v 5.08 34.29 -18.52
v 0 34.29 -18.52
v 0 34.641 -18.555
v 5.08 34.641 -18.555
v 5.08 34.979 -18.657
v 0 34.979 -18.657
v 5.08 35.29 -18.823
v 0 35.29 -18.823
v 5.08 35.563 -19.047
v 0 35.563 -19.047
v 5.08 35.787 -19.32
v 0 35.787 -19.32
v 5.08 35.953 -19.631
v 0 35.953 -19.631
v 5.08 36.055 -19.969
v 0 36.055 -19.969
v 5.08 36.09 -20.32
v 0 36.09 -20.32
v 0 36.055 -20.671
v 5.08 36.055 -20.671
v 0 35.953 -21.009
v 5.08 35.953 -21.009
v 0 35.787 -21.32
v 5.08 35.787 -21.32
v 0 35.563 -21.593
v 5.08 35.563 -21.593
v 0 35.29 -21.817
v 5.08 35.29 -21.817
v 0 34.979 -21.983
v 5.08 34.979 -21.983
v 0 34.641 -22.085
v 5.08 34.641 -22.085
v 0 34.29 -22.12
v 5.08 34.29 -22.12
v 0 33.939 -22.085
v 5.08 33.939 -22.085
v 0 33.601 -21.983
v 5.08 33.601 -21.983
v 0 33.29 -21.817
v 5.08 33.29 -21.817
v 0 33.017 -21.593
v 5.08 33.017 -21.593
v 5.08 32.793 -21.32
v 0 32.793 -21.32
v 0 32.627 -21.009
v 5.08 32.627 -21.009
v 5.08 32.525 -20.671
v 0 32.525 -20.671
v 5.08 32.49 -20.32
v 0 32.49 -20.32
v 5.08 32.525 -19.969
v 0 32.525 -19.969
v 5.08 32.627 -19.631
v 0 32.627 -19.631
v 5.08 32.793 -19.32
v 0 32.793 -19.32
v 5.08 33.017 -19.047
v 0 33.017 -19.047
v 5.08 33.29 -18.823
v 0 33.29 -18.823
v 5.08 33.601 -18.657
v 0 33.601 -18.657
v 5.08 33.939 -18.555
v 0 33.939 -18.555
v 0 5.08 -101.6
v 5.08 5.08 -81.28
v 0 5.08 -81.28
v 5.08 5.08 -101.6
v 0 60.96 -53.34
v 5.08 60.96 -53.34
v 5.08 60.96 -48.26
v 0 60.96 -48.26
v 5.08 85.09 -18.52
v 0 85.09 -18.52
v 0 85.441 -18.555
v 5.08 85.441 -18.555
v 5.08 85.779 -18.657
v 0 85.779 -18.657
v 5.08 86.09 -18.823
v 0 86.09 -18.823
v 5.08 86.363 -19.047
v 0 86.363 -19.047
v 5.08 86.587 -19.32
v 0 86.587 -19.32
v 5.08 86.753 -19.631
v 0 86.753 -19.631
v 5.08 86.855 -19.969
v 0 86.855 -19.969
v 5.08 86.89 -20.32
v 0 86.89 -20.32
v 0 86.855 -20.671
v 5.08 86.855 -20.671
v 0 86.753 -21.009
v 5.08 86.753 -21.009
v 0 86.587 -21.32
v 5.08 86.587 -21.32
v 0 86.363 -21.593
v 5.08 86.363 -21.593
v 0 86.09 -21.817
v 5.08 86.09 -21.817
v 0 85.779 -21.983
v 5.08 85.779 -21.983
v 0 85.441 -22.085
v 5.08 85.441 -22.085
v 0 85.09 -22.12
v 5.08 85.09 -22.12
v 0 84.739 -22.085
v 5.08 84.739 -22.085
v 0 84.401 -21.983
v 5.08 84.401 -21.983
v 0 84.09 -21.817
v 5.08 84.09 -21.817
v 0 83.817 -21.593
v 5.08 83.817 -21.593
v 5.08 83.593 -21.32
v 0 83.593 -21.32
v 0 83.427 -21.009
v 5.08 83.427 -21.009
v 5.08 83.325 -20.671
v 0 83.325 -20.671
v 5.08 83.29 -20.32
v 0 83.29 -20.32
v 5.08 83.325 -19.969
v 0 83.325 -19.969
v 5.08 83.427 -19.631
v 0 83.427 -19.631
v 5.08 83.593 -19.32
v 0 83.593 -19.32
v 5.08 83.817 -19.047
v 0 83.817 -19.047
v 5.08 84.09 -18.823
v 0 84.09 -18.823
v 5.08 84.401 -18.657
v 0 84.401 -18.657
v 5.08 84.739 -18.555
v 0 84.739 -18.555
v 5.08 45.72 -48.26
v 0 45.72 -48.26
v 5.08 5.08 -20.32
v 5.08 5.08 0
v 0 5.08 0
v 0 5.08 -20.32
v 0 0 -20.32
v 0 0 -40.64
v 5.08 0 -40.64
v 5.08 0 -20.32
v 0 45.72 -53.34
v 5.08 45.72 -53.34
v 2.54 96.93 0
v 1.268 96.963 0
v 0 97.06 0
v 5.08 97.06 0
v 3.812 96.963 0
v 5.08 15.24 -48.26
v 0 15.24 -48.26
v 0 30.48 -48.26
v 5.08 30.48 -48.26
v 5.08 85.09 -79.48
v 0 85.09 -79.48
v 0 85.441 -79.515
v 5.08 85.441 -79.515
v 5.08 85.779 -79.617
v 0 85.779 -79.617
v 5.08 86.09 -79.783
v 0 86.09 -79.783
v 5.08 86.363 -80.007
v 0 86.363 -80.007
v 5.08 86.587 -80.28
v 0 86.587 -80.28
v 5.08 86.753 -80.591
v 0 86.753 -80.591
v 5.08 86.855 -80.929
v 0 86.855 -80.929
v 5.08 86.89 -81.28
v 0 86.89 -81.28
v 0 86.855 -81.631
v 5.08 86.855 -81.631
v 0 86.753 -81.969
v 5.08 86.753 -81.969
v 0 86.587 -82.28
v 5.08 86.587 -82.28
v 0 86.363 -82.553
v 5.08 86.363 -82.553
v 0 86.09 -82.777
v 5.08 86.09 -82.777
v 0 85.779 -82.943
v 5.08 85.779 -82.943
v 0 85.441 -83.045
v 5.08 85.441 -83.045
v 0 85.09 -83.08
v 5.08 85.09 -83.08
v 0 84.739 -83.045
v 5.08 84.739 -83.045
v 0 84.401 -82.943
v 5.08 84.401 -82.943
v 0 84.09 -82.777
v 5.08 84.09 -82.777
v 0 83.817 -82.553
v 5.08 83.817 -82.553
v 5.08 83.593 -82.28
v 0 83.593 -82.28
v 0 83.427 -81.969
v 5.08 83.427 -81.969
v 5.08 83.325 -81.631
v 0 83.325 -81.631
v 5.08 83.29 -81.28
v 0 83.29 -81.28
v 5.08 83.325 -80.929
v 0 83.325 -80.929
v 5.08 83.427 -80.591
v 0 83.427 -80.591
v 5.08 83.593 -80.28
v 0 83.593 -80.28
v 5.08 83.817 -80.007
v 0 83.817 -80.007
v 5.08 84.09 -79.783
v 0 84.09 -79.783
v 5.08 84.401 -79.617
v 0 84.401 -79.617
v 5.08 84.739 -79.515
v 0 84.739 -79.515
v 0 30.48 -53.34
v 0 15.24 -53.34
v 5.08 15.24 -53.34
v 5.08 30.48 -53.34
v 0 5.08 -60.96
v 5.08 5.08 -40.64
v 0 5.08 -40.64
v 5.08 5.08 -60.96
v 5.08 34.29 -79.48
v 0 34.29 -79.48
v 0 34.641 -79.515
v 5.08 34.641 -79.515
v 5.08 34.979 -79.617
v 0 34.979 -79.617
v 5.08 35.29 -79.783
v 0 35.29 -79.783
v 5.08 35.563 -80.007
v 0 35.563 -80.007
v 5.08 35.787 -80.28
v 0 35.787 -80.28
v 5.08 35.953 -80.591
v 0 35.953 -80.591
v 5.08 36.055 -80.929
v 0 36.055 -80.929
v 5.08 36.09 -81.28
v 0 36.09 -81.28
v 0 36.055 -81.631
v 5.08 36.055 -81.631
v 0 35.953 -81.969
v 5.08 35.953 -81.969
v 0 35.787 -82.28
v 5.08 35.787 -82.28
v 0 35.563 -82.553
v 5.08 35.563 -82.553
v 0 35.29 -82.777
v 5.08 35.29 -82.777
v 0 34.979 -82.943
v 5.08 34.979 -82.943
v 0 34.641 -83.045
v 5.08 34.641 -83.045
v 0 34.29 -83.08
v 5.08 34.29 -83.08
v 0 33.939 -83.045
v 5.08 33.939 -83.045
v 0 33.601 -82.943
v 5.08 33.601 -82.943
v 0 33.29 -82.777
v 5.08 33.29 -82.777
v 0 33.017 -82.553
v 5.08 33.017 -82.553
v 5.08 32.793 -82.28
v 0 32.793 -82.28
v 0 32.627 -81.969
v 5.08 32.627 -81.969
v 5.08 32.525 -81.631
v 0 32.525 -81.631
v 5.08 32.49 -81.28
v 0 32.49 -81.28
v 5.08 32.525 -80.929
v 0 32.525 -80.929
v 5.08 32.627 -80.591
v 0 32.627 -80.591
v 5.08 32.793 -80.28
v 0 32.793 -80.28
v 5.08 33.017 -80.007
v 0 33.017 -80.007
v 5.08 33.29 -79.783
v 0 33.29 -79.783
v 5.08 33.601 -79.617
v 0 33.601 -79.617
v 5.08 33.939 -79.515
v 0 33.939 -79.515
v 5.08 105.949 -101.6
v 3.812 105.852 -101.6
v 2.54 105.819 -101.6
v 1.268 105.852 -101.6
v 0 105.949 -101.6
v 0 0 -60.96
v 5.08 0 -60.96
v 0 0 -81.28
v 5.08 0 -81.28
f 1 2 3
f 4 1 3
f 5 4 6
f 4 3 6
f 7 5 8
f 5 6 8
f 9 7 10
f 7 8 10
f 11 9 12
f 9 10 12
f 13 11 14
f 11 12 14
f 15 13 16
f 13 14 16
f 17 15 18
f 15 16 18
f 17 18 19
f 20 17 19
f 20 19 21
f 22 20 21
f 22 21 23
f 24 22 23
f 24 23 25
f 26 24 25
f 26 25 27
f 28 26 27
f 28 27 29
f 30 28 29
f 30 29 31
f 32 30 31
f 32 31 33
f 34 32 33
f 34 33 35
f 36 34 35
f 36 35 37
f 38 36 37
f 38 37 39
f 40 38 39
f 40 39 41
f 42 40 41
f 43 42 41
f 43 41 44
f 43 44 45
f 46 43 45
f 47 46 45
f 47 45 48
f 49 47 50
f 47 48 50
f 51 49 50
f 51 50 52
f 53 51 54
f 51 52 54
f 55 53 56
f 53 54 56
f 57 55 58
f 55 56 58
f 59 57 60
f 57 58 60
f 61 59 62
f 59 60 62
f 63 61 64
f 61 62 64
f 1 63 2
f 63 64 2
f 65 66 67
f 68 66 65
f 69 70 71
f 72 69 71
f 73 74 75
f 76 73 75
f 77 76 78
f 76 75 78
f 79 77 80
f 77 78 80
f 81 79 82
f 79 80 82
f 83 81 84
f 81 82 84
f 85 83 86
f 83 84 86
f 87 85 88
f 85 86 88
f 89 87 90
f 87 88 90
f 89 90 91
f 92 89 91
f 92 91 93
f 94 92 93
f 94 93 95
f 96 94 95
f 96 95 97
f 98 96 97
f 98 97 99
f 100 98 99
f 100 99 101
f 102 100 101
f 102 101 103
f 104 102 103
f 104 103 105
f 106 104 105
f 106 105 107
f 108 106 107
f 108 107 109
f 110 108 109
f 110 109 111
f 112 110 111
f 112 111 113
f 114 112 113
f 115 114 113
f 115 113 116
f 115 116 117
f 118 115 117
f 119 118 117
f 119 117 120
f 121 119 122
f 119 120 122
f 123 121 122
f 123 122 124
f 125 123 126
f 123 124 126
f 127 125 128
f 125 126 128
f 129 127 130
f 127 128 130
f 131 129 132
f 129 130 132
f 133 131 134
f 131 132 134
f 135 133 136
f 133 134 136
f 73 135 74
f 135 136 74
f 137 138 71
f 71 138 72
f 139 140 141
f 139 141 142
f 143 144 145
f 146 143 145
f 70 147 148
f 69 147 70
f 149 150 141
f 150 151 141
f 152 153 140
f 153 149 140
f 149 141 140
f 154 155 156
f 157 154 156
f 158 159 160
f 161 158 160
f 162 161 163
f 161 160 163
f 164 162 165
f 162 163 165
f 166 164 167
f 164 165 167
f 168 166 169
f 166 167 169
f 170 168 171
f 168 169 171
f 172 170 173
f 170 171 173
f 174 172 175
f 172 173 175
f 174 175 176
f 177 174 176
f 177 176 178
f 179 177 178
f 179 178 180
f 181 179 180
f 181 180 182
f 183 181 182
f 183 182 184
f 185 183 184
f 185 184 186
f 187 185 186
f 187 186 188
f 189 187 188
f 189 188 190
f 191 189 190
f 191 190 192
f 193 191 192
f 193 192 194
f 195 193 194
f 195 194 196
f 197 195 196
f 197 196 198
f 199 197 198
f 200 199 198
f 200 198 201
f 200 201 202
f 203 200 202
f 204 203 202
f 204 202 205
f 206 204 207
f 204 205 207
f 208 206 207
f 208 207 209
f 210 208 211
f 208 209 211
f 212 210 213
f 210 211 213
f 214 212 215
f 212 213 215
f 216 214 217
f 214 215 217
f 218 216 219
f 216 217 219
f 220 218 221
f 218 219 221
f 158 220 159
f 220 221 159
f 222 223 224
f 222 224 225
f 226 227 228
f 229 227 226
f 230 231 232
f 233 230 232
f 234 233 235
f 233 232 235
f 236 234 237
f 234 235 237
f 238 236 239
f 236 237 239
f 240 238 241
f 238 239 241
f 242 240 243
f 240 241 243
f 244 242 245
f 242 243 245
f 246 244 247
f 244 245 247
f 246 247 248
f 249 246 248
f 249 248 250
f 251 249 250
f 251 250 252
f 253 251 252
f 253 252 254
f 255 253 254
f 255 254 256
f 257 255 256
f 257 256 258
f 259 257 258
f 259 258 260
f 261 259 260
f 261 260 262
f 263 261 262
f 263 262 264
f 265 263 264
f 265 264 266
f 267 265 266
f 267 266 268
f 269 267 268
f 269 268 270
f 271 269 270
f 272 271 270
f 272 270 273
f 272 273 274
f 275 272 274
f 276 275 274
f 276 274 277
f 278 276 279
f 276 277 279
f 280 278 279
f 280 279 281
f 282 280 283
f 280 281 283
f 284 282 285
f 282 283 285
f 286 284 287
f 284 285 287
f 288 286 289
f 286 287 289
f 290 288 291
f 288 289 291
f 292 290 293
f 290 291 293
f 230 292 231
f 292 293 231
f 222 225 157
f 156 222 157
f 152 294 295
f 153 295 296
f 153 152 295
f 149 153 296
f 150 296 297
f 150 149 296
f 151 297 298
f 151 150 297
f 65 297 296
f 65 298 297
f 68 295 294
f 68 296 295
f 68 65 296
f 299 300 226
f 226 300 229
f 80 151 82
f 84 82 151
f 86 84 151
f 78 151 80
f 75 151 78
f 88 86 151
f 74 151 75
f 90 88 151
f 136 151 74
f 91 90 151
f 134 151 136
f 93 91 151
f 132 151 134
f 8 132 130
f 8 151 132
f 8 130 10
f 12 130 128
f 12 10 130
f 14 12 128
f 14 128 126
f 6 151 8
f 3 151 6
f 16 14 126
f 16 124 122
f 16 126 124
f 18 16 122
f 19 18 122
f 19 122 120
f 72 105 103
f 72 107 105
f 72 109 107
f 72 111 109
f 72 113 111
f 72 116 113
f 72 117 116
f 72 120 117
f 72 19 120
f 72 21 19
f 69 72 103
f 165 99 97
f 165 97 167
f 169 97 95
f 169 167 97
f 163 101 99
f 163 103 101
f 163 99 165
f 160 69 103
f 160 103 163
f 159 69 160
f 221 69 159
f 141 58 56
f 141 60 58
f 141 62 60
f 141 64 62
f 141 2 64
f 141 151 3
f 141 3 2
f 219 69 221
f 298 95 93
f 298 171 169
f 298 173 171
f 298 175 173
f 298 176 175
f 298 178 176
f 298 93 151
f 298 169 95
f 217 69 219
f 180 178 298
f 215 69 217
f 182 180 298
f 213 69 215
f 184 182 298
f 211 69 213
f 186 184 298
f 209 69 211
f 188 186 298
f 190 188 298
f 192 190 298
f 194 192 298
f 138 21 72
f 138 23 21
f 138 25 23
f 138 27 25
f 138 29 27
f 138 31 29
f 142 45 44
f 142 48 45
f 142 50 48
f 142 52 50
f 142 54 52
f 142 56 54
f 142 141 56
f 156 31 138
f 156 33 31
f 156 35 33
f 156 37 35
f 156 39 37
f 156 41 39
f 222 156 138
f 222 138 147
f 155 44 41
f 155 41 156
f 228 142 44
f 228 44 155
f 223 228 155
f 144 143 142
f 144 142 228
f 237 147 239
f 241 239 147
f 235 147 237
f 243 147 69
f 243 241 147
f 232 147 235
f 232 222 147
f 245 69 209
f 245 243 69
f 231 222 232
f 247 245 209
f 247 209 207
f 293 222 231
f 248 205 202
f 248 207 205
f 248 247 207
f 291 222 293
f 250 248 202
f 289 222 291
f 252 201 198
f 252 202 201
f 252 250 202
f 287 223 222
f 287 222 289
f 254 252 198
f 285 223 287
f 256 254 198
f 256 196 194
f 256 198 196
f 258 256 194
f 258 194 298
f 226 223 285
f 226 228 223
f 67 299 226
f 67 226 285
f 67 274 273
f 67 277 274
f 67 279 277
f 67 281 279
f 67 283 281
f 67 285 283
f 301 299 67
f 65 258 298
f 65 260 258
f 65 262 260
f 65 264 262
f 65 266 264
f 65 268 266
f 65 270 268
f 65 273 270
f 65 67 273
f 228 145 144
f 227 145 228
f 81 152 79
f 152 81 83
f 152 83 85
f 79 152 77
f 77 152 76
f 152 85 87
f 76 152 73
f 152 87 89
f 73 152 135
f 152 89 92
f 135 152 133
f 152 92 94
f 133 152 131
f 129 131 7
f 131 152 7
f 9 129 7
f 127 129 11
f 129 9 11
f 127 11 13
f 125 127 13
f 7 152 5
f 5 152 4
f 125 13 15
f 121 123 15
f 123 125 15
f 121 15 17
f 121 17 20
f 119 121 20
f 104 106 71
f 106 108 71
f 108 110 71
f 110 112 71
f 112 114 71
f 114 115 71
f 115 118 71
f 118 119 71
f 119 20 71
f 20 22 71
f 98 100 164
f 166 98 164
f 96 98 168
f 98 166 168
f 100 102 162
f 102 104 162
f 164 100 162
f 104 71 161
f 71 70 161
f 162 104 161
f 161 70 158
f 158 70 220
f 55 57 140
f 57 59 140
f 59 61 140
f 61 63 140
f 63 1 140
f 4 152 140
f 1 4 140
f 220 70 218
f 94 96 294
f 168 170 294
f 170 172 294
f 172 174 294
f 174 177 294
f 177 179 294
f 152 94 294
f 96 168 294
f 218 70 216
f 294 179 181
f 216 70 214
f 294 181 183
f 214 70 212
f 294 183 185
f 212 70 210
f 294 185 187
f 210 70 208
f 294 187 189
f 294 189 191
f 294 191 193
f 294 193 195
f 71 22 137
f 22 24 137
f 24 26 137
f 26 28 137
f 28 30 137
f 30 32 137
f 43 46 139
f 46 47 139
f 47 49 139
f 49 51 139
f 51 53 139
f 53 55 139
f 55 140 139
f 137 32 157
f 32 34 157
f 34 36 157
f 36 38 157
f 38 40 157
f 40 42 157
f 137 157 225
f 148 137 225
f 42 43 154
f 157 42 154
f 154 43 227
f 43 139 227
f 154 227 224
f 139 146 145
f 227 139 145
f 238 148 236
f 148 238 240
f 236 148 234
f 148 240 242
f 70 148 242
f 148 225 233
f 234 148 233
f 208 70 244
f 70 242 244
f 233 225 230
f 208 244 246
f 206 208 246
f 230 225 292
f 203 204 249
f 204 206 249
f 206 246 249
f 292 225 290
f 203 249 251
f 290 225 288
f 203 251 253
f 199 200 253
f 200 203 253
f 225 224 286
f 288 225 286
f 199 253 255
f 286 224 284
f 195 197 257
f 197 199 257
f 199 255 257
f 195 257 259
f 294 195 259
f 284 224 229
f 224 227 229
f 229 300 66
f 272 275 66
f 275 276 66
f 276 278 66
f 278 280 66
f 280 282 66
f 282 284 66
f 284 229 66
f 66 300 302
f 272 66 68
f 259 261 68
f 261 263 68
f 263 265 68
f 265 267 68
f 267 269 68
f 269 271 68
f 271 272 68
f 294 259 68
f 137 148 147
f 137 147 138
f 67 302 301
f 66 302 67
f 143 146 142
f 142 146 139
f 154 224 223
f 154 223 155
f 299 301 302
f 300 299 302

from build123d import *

# Parameters (mm, degrees)
BOSS_EXTRUDE1_OUTLINE_W = 5.08
BOSS_EXTRUDE1_OUTLINE_H = 101.6
BOSS_EXTRUDE1_DEPTH     = 105.948861845
BOSS_EXTRUDE1_START     = 7
BOSS_EXTRUDE1_2_DEPTH   = 104
M3_CLEARANCE_HOLE1_D    = 3.6
SKETCH12_W              = 20.32
SKETCH12_H              = 5.08
CUT_EXTRUDE1_DEPTH      = 147.879296452
SKETCH13_W              = 5.08
SKETCH13_H              = 15.24
CUT_EXTRUDE2_DEPTH      = 147.879296452


with BuildPart() as part:
    # Boss-Extrude1: read off the stored shape, not the designer's step
    # Boss-Extrude1 outline → Boss-Extrude1 (new body)
    with BuildSketch(Plane(origin=(0, 0, 0), x_dir=(1, 0, 0), z_dir=(0, 1, 0))):
        with Locations((2.54, 50.8)):
            Rectangle(BOSS_EXTRUDE1_OUTLINE_W, BOSS_EXTRUDE1_OUTLINE_H)
    extrude(amount=BOSS_EXTRUDE1_DEPTH)

    # Boss-Extrude1 2 outline → Boss-Extrude1 2 (cut)
    with BuildSketch(Plane(origin=(0, 0, 0), x_dir=(1, 0, 0), z_dir=(0, 0.08715574274764448, -0.9961946980917468)).offset(BOSS_EXTRUDE1_START)):
        with BuildLine():
            ThreePointArc((5.08, -96.690670975), (2.54, -96.561403015), (0, -96.690670975))
            Line((0, -96.690670975), (-2, -96.894771203))
            Line((-2, -96.894771203), (-2, -107))
            Line((-2, -107), (7, -107))
            Line((7, -107), (7, -96.886607194))
            Line((7, -96.886607194), (5.08, -96.690670975))
        make_face()
    extrude(amount=BOSS_EXTRUDE1_2_DEPTH, mode=Mode.SUBTRACT)

    # M3 Clearance Hole1 (through all)
    with Locations(Plane(origin=(5.08, 0, 0), x_dir=(0, 0, -1), z_dir=(1, 0, 0))):
        with Locations((81.28, 85.09), (20.32, 85.09), (20.32, 34.29), (81.28, 34.29)):
            Hole(M3_CLEARANCE_HOLE1_D / 2)

    # Sketch12 → Cut-Extrude1 (cut, through all)
    with BuildSketch(Plane(origin=(5.08, 0, 0), x_dir=(0, 0, -1), z_dir=(1, 0, 0))):
        with Locations((91.44, 2.54)):
            Rectangle(SKETCH12_W, SKETCH12_H)
        with Locations((50.8, 2.54)):
            Rectangle(SKETCH12_W, SKETCH12_H)
        with Locations((10.16, 2.54)):
            Rectangle(SKETCH12_W, SKETCH12_H)
    extrude(amount=-CUT_EXTRUDE1_DEPTH, mode=Mode.SUBTRACT)

    # Sketch13 → Cut-Extrude2 (cut, through all)
    with BuildSketch(Plane.ZY):
        with Locations((-50.8, 53.34)):
            Rectangle(SKETCH13_W, SKETCH13_H)
        with Locations((-50.8, 22.86)):
            Rectangle(SKETCH13_W, SKETCH13_H)
    extrude(amount=-CUT_EXTRUDE2_DEPTH, mode=Mode.SUBTRACT)


solid = part.part
